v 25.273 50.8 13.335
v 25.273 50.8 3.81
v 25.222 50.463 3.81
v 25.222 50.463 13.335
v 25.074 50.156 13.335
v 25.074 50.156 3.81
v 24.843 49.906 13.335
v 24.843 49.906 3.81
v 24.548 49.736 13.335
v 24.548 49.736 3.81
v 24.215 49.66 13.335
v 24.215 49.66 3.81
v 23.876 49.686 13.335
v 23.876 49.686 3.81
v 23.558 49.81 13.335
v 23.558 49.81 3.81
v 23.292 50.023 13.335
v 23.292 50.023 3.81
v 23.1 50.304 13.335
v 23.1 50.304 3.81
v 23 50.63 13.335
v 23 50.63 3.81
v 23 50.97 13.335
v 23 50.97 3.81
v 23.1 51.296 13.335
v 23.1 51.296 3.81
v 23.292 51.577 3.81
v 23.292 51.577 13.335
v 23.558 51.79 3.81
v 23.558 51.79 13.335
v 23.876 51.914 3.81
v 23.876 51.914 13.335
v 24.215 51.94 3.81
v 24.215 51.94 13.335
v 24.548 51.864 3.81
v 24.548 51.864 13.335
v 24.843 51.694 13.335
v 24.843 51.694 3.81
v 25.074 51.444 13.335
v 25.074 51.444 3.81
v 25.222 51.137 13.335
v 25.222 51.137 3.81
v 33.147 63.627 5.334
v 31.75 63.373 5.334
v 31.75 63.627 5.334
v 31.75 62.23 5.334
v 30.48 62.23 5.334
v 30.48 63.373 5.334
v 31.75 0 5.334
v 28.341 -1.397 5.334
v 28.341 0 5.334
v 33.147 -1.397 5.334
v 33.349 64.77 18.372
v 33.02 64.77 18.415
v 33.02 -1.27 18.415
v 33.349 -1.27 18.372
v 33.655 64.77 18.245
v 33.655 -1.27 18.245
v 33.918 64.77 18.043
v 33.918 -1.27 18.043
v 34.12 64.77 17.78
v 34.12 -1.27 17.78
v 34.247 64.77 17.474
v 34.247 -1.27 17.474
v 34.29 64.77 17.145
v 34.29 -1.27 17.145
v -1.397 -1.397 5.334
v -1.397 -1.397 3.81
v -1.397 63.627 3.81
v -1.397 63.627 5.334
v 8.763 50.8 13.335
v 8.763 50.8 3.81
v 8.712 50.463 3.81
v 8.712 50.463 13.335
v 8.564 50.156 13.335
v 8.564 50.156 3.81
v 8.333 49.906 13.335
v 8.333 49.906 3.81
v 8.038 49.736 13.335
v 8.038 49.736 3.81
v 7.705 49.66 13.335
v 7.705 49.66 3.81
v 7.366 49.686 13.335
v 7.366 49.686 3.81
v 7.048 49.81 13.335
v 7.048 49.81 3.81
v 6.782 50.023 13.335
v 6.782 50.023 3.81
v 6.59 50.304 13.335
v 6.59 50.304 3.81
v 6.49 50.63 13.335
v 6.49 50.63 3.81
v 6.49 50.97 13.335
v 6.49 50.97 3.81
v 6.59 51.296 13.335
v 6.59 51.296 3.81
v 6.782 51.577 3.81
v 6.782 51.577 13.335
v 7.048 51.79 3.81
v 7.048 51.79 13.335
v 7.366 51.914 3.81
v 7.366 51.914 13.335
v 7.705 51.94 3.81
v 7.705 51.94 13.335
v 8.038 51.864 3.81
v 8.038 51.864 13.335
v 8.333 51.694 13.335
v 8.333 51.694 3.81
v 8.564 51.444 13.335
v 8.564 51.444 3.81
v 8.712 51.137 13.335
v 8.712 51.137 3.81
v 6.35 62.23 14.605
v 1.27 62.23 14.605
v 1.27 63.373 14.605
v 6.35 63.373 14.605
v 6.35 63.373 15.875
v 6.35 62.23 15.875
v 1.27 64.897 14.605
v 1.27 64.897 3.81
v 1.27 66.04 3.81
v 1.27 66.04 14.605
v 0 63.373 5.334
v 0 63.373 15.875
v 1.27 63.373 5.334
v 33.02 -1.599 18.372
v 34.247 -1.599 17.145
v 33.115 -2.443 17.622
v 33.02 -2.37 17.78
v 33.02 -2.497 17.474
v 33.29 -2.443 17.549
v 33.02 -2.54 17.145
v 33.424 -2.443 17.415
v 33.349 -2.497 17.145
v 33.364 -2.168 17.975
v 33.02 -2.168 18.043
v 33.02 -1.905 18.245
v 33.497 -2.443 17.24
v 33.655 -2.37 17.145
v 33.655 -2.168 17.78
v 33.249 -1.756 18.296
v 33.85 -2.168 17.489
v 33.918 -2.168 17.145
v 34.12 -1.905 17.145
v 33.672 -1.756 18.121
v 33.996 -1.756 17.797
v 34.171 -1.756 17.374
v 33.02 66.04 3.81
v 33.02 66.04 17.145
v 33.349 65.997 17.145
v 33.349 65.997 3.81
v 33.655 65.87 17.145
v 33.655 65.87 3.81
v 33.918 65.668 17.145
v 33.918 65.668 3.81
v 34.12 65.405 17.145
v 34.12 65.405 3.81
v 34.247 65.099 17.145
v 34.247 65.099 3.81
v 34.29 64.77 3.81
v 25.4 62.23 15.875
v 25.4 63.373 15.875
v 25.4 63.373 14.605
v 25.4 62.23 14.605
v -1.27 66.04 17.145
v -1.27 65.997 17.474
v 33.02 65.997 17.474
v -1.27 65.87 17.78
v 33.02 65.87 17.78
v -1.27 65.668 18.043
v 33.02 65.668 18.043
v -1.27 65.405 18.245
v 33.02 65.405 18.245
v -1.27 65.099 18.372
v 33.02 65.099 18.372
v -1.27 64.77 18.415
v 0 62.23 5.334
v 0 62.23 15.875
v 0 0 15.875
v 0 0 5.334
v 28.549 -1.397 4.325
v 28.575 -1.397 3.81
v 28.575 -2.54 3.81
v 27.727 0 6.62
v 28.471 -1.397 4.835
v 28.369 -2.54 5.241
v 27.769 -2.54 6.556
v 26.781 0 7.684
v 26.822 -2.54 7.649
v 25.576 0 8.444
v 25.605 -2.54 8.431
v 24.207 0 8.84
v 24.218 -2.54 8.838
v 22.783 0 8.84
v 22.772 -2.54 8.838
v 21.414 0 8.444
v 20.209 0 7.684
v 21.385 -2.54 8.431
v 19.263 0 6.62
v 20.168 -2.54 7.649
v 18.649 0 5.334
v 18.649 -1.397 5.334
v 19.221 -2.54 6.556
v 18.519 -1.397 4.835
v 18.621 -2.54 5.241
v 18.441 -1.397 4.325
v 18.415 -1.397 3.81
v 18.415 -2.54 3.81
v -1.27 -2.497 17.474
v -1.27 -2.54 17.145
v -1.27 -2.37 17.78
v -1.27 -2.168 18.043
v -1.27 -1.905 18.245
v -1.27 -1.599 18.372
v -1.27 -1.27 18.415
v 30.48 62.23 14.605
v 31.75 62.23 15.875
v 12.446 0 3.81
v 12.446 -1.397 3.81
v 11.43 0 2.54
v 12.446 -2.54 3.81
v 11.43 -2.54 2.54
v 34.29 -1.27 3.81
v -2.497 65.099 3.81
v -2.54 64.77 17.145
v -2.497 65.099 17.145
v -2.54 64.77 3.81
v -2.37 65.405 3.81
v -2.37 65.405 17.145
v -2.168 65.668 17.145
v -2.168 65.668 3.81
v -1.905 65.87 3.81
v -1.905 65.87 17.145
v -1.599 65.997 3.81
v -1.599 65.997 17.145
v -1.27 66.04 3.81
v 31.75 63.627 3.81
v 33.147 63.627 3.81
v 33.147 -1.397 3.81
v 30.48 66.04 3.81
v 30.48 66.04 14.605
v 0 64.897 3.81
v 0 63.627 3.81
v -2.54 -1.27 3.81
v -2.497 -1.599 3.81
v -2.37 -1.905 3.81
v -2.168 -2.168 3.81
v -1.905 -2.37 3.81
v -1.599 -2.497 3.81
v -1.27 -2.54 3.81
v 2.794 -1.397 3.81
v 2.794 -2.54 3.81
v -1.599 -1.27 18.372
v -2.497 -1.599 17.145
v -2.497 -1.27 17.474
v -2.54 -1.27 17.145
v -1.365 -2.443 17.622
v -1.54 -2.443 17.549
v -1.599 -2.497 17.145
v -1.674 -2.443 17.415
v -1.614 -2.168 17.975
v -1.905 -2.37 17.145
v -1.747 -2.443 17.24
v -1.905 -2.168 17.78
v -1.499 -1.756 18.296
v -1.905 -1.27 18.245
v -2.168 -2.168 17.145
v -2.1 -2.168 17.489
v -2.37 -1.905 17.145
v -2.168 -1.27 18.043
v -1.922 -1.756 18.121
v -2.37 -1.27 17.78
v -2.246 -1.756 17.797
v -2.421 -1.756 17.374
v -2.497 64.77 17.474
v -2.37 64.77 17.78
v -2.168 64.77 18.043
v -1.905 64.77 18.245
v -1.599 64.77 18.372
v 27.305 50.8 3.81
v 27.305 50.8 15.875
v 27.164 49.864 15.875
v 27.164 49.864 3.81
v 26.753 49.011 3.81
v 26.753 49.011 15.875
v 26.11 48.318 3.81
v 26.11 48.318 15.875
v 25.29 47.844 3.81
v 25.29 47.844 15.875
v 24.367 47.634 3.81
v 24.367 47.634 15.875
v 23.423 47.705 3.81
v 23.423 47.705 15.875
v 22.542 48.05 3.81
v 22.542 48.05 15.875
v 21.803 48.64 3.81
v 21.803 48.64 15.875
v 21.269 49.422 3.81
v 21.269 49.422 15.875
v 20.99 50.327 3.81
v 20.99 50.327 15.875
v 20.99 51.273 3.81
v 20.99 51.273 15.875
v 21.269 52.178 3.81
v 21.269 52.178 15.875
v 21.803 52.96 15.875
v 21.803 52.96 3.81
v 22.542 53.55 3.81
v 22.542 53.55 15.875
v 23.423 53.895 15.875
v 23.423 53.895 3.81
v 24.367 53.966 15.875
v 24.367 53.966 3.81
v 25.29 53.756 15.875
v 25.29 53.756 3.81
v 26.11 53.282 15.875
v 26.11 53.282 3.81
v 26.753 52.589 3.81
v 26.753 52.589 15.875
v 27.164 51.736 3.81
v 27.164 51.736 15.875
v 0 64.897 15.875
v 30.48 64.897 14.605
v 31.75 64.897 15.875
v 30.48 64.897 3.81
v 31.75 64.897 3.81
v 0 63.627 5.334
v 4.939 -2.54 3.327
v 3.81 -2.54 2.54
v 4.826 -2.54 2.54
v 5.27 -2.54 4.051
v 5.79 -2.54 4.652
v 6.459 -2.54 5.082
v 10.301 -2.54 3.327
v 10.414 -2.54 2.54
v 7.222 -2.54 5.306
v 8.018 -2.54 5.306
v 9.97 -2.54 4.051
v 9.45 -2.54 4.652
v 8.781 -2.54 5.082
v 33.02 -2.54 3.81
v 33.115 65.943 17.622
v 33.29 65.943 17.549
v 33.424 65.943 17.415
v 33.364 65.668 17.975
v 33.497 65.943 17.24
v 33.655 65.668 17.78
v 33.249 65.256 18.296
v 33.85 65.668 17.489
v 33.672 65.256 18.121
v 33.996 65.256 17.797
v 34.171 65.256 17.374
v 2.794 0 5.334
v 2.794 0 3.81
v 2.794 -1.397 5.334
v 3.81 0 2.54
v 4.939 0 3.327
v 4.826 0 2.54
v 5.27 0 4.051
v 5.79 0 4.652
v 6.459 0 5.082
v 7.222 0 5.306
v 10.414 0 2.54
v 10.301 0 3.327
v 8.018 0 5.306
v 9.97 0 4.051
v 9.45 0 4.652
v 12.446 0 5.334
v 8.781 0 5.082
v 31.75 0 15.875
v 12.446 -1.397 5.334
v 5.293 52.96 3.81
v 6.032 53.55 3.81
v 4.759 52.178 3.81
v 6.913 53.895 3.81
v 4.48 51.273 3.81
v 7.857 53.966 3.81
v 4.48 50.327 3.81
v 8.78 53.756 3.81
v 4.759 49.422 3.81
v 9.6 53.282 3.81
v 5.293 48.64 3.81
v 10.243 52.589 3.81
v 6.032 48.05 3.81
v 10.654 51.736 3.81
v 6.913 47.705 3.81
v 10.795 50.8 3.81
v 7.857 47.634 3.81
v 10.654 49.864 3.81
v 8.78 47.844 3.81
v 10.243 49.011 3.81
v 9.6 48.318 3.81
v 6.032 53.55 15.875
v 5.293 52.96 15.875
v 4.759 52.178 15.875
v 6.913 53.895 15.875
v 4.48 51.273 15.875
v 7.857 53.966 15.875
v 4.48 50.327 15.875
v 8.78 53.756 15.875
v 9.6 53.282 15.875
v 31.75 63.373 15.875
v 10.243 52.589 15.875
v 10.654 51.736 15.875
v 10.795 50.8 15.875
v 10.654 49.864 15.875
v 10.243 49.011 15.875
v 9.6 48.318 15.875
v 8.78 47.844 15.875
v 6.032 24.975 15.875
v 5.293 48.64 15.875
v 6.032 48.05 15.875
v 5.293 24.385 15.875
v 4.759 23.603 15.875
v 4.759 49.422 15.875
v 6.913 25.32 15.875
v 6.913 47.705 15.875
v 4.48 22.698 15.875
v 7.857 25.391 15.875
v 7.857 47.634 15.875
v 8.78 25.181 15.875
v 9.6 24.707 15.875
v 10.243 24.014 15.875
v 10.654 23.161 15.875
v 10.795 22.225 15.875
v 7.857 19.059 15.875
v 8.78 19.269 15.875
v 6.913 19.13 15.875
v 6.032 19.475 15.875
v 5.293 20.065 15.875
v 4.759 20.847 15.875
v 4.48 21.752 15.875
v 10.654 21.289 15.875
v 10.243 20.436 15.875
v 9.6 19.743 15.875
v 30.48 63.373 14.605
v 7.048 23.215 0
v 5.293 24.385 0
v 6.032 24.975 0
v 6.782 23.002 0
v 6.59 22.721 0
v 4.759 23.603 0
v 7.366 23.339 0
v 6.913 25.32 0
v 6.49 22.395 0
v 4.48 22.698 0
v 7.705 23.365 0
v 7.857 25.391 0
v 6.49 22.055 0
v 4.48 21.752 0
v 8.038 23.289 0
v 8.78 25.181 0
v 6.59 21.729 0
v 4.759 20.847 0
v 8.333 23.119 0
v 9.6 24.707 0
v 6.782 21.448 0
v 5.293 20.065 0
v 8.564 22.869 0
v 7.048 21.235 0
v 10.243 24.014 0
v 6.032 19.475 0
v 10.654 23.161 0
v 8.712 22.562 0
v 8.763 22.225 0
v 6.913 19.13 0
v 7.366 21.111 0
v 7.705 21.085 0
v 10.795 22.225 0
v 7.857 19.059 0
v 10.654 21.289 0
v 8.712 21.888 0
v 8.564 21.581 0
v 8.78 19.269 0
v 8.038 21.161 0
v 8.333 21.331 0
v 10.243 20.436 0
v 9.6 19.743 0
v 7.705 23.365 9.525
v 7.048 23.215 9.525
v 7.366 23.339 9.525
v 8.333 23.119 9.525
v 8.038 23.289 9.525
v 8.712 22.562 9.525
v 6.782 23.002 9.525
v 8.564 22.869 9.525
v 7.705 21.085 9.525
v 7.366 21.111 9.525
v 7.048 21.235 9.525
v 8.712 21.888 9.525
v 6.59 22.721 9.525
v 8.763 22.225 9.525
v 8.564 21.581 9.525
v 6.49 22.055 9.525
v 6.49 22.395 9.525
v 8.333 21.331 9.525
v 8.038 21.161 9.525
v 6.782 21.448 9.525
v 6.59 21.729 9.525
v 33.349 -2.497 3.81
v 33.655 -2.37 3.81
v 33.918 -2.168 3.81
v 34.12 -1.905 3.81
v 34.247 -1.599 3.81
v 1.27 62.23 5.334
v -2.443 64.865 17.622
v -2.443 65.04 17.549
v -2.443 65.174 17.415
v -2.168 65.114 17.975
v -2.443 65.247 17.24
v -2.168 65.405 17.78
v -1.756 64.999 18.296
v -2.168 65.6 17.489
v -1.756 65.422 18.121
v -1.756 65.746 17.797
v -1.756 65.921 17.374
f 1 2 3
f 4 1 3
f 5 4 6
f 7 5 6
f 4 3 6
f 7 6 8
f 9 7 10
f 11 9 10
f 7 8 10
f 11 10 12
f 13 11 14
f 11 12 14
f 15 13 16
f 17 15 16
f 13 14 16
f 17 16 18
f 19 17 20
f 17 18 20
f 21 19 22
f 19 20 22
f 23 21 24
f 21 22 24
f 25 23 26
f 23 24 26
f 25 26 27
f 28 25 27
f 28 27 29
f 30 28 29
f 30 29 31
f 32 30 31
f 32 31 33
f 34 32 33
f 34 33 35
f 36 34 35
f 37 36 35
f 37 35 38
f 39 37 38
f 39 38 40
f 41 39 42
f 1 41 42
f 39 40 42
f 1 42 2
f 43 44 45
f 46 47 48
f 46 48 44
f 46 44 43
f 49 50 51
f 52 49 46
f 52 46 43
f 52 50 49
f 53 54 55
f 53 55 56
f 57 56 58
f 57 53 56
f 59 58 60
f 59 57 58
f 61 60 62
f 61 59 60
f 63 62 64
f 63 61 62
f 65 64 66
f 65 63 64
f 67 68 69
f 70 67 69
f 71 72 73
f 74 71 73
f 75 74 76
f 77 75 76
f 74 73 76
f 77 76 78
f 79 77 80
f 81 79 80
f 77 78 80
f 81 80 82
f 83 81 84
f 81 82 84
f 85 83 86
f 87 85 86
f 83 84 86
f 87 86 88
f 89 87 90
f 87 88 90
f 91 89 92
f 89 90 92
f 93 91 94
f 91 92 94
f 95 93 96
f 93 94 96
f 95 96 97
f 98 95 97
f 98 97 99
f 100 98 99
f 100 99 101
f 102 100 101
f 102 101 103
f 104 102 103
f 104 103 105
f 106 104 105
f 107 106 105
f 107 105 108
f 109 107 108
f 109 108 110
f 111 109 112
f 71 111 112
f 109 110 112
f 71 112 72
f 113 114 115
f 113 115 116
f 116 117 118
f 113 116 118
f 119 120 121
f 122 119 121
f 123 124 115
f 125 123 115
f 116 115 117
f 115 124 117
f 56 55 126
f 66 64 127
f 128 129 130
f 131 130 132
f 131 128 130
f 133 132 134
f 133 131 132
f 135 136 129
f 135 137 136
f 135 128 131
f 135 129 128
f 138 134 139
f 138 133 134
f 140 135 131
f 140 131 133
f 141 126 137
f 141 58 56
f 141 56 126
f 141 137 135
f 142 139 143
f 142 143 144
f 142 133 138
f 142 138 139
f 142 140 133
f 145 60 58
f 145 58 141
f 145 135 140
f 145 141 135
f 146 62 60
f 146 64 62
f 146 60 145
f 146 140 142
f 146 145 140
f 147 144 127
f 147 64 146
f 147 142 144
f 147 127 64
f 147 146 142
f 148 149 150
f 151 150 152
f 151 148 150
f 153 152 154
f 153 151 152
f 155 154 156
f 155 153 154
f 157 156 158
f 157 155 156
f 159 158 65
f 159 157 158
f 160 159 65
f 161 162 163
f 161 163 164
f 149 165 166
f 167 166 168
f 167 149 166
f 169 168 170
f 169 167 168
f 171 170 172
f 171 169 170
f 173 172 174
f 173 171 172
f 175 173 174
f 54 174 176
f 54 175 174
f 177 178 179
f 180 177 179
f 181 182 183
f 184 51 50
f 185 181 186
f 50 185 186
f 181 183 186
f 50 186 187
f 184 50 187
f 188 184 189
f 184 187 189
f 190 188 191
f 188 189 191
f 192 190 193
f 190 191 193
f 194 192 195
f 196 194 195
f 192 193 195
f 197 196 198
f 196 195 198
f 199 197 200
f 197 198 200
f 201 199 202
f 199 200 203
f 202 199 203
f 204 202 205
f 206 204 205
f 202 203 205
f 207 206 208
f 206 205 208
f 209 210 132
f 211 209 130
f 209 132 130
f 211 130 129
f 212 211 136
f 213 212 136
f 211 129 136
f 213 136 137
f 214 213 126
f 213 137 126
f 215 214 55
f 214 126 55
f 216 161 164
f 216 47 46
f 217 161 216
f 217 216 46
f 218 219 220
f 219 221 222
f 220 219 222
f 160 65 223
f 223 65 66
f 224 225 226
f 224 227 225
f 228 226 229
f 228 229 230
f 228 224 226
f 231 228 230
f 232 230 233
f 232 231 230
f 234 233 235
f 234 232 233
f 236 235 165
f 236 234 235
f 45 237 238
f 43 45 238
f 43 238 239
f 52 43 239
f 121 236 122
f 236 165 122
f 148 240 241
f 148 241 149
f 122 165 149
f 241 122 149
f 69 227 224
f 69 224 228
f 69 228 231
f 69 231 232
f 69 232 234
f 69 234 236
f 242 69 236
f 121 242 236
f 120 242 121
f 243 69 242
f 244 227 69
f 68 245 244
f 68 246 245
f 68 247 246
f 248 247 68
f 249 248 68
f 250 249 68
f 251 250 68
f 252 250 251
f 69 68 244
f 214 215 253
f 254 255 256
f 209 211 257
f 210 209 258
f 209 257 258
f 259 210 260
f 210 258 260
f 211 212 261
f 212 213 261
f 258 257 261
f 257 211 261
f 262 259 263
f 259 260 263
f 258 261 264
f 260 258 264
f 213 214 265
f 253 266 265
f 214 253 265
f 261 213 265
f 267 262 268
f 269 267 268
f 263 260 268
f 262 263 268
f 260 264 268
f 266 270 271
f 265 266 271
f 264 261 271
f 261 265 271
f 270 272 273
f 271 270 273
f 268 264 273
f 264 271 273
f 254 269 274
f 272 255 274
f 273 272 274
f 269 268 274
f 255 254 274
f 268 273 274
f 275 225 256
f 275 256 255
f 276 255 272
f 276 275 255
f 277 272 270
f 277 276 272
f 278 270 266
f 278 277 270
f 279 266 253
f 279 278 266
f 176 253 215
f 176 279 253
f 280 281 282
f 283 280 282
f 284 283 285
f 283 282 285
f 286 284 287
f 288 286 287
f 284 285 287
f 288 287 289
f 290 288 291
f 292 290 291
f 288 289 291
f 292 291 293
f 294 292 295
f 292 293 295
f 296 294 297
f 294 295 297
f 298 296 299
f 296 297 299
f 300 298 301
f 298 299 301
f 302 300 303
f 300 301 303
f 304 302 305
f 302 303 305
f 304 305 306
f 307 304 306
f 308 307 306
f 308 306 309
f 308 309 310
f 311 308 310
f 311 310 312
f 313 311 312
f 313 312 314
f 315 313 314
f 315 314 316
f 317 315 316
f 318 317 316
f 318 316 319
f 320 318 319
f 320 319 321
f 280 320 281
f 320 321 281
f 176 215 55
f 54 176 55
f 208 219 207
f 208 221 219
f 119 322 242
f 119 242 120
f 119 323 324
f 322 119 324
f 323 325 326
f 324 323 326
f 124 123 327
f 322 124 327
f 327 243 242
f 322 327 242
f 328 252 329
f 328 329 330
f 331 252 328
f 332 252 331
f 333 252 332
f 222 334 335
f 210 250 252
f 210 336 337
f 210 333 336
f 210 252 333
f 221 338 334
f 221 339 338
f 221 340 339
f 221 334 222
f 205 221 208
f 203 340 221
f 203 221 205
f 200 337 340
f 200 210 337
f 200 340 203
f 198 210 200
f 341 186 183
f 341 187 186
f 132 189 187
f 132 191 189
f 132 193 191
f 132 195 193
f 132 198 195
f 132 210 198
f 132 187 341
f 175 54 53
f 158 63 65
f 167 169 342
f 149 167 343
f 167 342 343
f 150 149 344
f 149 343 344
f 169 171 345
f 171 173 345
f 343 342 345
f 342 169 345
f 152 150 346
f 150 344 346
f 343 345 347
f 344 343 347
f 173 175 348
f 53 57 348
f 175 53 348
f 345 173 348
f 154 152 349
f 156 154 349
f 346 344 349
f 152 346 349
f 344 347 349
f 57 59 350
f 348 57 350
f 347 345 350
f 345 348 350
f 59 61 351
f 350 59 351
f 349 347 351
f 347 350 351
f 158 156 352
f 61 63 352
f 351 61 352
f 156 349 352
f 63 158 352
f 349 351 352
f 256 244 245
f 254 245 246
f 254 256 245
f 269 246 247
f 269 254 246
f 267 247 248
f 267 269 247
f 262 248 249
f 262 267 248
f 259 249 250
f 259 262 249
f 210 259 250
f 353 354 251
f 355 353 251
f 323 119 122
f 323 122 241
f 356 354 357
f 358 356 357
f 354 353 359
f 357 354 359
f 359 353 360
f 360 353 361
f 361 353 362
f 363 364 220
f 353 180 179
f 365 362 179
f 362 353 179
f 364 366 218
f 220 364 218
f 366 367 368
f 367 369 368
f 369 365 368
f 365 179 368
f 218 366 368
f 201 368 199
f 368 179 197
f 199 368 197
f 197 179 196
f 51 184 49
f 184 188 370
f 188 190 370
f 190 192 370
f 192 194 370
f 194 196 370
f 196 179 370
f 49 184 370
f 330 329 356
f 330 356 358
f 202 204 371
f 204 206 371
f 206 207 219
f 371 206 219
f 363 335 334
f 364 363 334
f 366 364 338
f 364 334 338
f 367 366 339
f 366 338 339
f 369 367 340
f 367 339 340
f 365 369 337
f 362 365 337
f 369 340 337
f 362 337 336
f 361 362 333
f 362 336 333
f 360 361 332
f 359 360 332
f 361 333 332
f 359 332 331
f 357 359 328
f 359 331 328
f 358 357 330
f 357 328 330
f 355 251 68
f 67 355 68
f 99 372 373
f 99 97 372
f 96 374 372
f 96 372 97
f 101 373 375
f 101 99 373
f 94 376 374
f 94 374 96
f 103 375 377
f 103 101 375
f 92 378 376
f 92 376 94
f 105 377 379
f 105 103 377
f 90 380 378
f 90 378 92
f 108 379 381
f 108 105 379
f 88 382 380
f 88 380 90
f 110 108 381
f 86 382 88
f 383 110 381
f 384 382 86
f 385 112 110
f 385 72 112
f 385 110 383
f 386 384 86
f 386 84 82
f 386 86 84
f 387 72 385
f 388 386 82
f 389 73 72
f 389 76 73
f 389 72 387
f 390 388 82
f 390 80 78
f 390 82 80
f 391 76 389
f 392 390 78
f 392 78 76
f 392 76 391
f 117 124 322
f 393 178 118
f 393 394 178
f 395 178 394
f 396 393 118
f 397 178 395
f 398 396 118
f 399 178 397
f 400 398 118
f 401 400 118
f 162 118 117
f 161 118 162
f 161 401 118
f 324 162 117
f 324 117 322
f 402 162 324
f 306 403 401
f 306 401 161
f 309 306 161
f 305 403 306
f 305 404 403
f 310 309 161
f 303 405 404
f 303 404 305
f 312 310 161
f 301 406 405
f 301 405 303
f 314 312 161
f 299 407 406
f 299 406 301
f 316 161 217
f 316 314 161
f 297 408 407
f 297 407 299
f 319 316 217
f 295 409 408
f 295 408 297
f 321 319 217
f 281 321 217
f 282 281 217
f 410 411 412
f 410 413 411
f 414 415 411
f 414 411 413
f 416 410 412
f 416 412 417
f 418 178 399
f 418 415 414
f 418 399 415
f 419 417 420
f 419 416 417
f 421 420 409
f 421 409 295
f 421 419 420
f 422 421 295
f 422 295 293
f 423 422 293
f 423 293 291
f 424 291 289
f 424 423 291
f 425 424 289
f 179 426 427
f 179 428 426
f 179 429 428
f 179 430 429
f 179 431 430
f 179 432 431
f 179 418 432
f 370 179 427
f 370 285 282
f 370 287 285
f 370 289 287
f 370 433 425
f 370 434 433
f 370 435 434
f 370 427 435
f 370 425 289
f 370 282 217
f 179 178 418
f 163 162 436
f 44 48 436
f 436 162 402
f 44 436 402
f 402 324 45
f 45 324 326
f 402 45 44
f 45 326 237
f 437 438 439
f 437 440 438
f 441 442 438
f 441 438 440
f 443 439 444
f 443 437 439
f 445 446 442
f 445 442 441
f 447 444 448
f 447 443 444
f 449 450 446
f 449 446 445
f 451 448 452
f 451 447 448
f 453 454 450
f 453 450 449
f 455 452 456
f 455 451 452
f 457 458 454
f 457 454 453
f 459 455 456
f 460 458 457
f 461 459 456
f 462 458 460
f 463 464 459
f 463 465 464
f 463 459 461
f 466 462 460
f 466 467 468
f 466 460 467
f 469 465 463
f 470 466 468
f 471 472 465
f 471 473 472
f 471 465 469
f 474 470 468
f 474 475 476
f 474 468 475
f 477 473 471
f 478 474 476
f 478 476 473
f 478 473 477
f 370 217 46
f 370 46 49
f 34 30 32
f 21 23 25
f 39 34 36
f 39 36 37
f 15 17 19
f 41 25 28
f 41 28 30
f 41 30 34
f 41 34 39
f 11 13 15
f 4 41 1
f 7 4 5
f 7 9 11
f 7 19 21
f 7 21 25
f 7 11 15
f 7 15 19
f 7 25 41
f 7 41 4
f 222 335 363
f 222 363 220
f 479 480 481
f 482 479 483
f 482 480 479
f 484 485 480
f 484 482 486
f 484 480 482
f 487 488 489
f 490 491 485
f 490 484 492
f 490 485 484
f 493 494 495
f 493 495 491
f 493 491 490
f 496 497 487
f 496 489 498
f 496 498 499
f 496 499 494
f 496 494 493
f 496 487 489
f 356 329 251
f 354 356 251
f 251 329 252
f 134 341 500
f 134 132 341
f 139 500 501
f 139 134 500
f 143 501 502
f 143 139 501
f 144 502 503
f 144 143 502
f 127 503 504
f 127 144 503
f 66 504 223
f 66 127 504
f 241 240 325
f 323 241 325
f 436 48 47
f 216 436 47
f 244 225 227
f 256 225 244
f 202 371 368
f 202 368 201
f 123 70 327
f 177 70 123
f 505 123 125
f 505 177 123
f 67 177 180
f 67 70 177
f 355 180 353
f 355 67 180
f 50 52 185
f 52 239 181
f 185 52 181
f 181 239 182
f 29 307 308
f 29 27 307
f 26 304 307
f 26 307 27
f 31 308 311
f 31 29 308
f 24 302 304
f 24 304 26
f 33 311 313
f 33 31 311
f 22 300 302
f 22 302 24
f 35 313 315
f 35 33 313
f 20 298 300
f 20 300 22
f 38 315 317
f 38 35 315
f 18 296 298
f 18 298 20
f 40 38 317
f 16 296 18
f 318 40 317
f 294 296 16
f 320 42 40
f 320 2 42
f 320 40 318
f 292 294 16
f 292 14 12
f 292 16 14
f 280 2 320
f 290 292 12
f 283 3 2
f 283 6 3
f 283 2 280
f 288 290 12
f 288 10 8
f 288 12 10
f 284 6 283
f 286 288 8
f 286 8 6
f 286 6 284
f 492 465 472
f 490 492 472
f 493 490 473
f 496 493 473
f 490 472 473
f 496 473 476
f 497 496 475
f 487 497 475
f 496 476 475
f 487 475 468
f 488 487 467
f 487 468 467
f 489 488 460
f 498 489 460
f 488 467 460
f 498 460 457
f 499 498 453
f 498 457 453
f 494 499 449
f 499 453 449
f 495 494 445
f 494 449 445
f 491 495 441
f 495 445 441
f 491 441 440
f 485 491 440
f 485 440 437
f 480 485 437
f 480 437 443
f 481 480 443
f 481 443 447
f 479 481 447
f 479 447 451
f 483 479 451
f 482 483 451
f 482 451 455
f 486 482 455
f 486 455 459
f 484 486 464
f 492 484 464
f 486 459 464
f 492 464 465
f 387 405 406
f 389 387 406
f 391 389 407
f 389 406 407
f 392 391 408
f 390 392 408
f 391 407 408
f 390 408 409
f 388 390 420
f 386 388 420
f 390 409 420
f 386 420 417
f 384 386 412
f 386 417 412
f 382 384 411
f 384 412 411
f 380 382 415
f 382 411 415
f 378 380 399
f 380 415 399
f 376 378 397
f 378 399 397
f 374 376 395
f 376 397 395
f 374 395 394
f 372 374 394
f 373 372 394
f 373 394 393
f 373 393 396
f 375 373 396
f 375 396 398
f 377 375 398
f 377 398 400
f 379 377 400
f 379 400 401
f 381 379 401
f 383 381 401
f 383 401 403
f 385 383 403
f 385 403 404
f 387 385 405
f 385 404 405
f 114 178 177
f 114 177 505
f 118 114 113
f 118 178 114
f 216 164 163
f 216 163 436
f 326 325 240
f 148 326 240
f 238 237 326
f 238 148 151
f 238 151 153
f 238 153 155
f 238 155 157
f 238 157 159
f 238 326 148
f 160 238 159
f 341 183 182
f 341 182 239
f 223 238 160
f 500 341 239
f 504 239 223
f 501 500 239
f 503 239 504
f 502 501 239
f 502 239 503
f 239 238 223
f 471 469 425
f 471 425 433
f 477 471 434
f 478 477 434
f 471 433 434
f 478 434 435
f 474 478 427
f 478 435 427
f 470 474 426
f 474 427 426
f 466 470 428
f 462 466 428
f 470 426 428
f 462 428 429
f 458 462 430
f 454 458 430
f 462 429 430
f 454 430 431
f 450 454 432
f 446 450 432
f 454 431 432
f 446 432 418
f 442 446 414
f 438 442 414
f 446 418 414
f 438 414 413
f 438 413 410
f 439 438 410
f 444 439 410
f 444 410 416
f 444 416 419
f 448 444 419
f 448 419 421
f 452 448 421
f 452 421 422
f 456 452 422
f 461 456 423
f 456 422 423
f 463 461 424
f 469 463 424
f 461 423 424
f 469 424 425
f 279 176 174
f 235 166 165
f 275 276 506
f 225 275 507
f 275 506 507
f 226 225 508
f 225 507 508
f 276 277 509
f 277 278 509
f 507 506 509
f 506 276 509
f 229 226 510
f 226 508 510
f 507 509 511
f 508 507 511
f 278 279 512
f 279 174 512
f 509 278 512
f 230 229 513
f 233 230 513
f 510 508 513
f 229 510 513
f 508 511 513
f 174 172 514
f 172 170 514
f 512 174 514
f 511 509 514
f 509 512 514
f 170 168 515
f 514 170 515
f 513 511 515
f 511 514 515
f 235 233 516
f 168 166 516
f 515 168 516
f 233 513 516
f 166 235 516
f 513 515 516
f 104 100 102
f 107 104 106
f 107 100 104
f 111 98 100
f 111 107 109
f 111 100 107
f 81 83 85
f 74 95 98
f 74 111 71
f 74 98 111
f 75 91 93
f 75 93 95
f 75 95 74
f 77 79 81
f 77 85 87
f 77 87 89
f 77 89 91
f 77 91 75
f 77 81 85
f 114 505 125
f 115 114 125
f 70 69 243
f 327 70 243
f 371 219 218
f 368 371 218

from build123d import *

# Parameters (mm, degrees)
SKETCH026_W     = 36.83
SKETCH026_H     = 68.58
PAD014_DEPTH    = 2.54
SKETCH027_W     = 36.83
SKETCH027_H     = 68.58
SKETCH027_W_2   = 31.75
SKETCH027_H_2   = 62.23
PAD015_DEPTH    = 12.065
SKETCH028_R     = 3.175
PAD016_DEPTH    = 12.065
SKETCH029_R     = 1.143
POCKET009_DEPTH = 9.525
SKETCH030_R     = 3.175
PAD017_DEPTH    = 15.875
SKETCH031_R     = 1.143
POCKET010_DEPTH = 9.525
PAD018_DEPTH    = 2.54
SKETCH033_R     = 2.794
SKETCH033_R_2   = 5.08
POCKET011_DEPTH = 5.08
POCKET012_DEPTH = 12.065
SKETCH035_W     = 5.08
SKETCH035_H     = 1.143
SKETCH035_W_2   = 29.21
PAD019_DEPTH    = 1.27
POCKET013_DEPTH = 1.524
FILLET_R        = 1.27


with BuildPart() as part:
    # Sketch026 → Pad014 (new body)
    with BuildSketch(Plane.XY):
        with Locations((15.875, 31.75)):
            Rectangle(SKETCH026_W, SKETCH026_H)
    extrude(amount=PAD014_DEPTH)

    # Sketch027 (on Face5 of Pad014) → Pad015 (join)
    with BuildSketch(Plane(origin=(0, 0, 0), x_dir=(1, 0, 0), z_dir=(0, 0, -1))):
        with Locations((15.875, -31.75)):
            Rectangle(SKETCH027_W, SKETCH027_H)
        with Locations((15.875, -31.115)):
            Rectangle(SKETCH027_W_2, SKETCH027_H_2, mode=Mode.SUBTRACT)
    extrude(amount=PAD015_DEPTH)

    # Sketch028 (on Face15 of Pad015) → Pad016 (join)
    with BuildSketch(Plane(origin=(0, 0, 0), x_dir=(1, 0, 0), z_dir=(0, 0, -1))):
        with Locations((7.62, -50.8)):
            Circle(SKETCH028_R)
        with Locations((24.13, -50.8)):
            Circle(SKETCH028_R)
    extrude(amount=PAD016_DEPTH)

    # Sketch029 (on Face18 of Pad016) → Pocket009 (cut)
    with BuildSketch(Plane(origin=(0, 0, -12.065), x_dir=(1, 0, 0), z_dir=(0, 0, -1))):
        with Locations((7.62, -50.8)):
            Circle(SKETCH029_R)
        with Locations((24.13, -50.8)):
            Circle(SKETCH029_R)
    extrude(amount=-POCKET009_DEPTH, mode=Mode.SUBTRACT)

    # Sketch030 (on Face15 of Pocket009) → Pad017 (join)
    with BuildSketch(Plane(origin=(0, 0, 0), x_dir=(1, 0, 0), z_dir=(0, 0, -1))):
        with Locations((7.62, -22.225)):
            Circle(SKETCH030_R)
    extrude(amount=PAD017_DEPTH)

    # Sketch031 (on Face19 of Pad017) → Pocket010 (cut)
    with BuildSketch(Plane(origin=(0, 0, -15.875), x_dir=(1, 0, 0), z_dir=(0, 0, -1))):
        with Locations((7.62, -22.225)):
            Circle(SKETCH031_R)
    extrude(amount=-POCKET010_DEPTH, mode=Mode.SUBTRACT)

    # Sketch032 (on Face4 of Pocket010) → Pad018 (join)
    with BuildSketch(Plane.XZ.offset(2.54)):
        Polygon((2.794, -12.065), (12.446, -12.065), (11.43, -13.335), (7.62, -13.335), (3.81, -13.335), align=None)
    extrude(amount=-PAD018_DEPTH)

    # Sketch033 (on Face4 of Pad018) → Pocket011 (cut)
    with BuildSketch(Plane.XZ.offset(2.54)):
        with Locations((7.62, -13.335)):
            Circle(SKETCH033_R)
        with Locations((23.495, -12.065)):
            Circle(SKETCH033_R_2)
    extrude(amount=-POCKET011_DEPTH, mode=Mode.SUBTRACT)

    # Sketch034 (on Face9 of Pocket011) → Pocket012 (cut)
    with BuildSketch(Plane(origin=(0, 0, -12.065), x_dir=(1, 0, 0), z_dir=(0, 0, -1))):
        Polygon((1.27, -62.23), (1.27, -63.373), (0, -63.373), (0, -64.897), (1.27, -64.897), (1.27, -66.04), (30.48, -66.04), (30.48, -64.897), (31.75, -64.897), (31.75, -63.373), (30.48, -63.373), (30.48, -62.23), align=None)
    extrude(amount=-POCKET012_DEPTH, mode=Mode.SUBTRACT)

    # Sketch035 (on Face17 of Pocket012) → Pad019 (join)
    with BuildSketch(Plane(origin=(0, 0, 0), x_dir=(1, 0, 0), z_dir=(0, 0, -1))):
        with Locations((3.81, -62.8015)):
            Rectangle(SKETCH035_W, SKETCH035_H)
        with Locations((15.875, -65.4685)):
            Rectangle(SKETCH035_W_2, SKETCH035_H)
        with Locations((27.94, -62.8015)):
            Rectangle(SKETCH035_W, SKETCH035_H)
    extrude(amount=PAD019_DEPTH)

    # Sketch036 (on Face15 of Pad019) → Pocket013 (cut)
    with BuildSketch(Plane(origin=(0, 0, -12.065), x_dir=(1, 0, 0), z_dir=(0, 0, -1))):
        Polygon((-1.397, 1.397), (-1.397, -63.627), (33.147, -63.627), (33.147, 1.397), (12.446, 1.397), (12.446, 0), (31.75, 0), (31.75, -62.23), (0, -62.23), (0, 0), (2.794, 0), (2.794, 1.397), align=None)
    extrude(amount=-POCKET013_DEPTH, mode=Mode.SUBTRACT)

    # Fillet
    fillet_edges = [part.edges().sort_by_distance(p)[0] for p in [
        (34.29, 31.75, 2.54),
        (15.875, 66.04, 2.54),
        (-2.54, 31.75, 2.54),
        (15.875, -2.54, 2.54),
        (34.29, -2.54, 1.27),
        (34.29, -2.54, -6.0325),
        (34.29, 66.04, 1.27),
        (34.29, 66.04, -6.0325),
        (-2.54, 66.04, -6.0325),
        (-2.54, 66.04, 1.27),
        (-2.54, -2.54, -6.0325),
        (-2.54, -2.54, 1.27),
    ]]
    fillet(fillet_edges, radius=FILLET_R)


with BuildPart() as part_1:
    # Body020 placement: moved
    add(part.part.moved(Location((0, 0, 15.875))))


solid = part_1.part
